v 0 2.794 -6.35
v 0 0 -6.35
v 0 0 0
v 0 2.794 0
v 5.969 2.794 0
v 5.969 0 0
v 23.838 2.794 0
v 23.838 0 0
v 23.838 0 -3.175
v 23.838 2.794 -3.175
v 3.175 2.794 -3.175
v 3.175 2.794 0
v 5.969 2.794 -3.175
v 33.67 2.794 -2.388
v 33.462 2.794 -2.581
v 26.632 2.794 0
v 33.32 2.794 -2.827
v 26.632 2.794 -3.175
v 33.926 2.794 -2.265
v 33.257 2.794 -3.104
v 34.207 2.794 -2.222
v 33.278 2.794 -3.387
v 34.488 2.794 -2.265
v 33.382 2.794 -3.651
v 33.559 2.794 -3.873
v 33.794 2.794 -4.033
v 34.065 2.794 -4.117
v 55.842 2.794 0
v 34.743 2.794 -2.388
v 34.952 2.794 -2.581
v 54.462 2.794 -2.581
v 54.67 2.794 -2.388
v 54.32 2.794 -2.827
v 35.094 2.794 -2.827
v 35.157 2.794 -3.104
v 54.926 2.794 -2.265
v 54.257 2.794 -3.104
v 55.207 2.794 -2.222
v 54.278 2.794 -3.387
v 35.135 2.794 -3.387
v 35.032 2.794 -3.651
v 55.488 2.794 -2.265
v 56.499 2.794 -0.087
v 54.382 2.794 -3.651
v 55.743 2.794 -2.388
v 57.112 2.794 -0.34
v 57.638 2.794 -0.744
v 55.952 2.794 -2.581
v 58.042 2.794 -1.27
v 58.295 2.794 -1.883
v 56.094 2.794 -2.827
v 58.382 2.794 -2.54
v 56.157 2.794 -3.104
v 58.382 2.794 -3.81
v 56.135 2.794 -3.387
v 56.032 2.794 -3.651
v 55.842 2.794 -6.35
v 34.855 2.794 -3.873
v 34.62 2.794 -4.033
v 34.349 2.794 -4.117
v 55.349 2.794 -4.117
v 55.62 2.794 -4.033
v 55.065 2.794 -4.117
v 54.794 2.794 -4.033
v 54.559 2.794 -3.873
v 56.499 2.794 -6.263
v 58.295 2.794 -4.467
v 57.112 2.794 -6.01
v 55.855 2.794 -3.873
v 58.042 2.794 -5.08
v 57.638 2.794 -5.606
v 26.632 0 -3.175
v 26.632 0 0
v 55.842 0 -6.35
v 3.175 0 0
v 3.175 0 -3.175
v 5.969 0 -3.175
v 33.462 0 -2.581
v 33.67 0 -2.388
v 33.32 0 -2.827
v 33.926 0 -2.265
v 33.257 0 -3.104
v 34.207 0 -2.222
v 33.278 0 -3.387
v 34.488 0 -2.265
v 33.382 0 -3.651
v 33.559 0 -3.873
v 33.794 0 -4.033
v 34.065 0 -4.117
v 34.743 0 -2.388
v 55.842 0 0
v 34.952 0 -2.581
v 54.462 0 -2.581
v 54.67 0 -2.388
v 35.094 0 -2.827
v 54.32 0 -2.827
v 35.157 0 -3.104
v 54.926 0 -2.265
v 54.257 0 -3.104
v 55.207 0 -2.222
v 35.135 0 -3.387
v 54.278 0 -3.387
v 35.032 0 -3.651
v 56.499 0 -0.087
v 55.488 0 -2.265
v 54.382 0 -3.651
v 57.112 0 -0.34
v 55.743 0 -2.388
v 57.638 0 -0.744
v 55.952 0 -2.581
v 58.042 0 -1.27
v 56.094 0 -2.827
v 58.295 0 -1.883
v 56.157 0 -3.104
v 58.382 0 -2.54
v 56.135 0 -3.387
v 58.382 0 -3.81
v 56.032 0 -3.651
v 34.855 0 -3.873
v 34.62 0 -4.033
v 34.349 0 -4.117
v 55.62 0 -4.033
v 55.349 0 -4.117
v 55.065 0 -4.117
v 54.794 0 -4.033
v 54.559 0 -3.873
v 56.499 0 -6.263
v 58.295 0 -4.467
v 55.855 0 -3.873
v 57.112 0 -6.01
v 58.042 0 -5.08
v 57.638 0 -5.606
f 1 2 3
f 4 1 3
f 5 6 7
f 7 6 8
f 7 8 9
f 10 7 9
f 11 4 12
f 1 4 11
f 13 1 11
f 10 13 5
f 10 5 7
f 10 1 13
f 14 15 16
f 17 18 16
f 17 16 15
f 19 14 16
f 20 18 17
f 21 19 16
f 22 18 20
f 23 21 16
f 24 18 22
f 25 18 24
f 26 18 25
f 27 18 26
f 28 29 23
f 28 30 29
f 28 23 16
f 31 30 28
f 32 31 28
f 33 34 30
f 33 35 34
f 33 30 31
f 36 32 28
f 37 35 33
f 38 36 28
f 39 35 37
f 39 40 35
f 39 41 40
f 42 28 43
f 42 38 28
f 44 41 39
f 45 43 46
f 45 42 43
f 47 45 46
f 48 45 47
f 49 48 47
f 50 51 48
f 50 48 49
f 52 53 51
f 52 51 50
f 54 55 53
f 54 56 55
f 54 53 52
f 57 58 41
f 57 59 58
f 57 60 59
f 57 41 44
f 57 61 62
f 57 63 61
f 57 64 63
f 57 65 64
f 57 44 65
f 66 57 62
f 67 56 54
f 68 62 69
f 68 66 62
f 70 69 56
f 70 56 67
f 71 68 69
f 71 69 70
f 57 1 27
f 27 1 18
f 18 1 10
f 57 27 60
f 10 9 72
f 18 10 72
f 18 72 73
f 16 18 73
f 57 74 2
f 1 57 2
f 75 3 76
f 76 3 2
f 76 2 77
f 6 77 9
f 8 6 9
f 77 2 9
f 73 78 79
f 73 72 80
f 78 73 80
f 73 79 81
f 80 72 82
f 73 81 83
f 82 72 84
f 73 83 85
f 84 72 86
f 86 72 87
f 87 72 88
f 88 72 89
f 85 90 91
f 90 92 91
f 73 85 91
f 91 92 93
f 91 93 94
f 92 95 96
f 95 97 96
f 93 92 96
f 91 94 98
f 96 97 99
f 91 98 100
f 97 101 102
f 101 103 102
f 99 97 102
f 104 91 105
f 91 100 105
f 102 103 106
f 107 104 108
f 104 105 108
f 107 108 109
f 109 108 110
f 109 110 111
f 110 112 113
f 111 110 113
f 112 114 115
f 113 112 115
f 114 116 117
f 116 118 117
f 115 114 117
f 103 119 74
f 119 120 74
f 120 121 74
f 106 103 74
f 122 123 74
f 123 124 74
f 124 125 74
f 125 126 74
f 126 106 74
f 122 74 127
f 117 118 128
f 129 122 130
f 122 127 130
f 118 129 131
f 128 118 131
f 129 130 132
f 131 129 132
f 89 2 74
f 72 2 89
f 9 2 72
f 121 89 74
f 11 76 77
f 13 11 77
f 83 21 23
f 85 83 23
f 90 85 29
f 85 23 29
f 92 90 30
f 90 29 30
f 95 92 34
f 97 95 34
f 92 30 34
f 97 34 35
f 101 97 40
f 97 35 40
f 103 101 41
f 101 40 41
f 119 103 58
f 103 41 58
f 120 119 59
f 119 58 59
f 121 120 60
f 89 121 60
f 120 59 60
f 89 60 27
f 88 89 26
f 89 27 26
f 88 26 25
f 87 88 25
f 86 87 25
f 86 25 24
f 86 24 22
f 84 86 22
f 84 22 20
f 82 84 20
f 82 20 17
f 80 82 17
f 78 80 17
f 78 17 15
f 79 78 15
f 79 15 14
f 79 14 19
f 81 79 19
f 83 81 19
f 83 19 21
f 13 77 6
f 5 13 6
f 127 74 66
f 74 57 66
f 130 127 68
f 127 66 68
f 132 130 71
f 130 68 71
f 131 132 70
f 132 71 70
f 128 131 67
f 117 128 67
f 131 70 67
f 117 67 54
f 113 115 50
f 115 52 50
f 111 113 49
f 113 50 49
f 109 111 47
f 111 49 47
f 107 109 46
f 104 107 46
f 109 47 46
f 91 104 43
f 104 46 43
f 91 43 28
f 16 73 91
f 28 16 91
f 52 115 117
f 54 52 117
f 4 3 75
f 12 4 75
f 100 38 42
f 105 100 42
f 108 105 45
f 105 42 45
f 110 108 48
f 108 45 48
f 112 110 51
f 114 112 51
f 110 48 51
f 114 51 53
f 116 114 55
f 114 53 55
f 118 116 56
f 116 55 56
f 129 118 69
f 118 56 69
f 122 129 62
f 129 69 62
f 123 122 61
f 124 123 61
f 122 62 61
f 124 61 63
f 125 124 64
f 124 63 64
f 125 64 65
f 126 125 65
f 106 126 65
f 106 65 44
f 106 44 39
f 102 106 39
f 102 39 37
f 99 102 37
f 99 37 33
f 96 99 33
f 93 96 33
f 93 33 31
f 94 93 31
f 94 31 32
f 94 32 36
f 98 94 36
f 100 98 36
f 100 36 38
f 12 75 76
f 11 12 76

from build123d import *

# Parameters (mm, degrees)
BOSS_EXTRUDE1_DEPTH = 2.794
SKETCH2_R           = 0.9525
CUT_EXTRUDE1_DEPTH  = 59.792605897
FILLET2_R           = 2.54


with BuildPart() as part:
    # Sketch1 → Boss-Extrude1 (new body)
    with BuildSketch(Plane(origin=(0, 0, 0), x_dir=(1, 0, 0), z_dir=(0, 1, 0))):
        Polygon((0, 0), (3.175, 0), (3.175, 3.175), (5.969, 3.175), (5.969, 0), (23.837859958, 0), (23.837859958, 3.175), (26.631859958, 3.175), (26.631859958, 0), (58.381859958, 0), (58.381859958, 6.35), (0, 6.35), align=None)
    extrude(amount=BOSS_EXTRUDE1_DEPTH)

    # Sketch2 → Cut-Extrude1 (cut, through all)
    with BuildSketch(Plane(origin=(0, 2.794, 0), x_dir=(1, 0, 0), z_dir=(0, 1, 0))):
        with Locations(Location((55.206859958, 3.175, 0), (0, 0, 270))):
            Circle(SKETCH2_R)
        with Locations(Location((34.206859958, 3.175, 0), (0, 0, 270))):
            Circle(SKETCH2_R)
    extrude(amount=-CUT_EXTRUDE1_DEPTH, mode=Mode.SUBTRACT)

    # Fillet2
    fillet2_edges = [part.edges().sort_by_distance(p)[0] for p in [
        (58.381859958, 1.397, -6.35),
        (58.381859958, 1.397, 0),
    ]]
    fillet(fillet2_edges, radius=FILLET2_R)


solid = part.part
